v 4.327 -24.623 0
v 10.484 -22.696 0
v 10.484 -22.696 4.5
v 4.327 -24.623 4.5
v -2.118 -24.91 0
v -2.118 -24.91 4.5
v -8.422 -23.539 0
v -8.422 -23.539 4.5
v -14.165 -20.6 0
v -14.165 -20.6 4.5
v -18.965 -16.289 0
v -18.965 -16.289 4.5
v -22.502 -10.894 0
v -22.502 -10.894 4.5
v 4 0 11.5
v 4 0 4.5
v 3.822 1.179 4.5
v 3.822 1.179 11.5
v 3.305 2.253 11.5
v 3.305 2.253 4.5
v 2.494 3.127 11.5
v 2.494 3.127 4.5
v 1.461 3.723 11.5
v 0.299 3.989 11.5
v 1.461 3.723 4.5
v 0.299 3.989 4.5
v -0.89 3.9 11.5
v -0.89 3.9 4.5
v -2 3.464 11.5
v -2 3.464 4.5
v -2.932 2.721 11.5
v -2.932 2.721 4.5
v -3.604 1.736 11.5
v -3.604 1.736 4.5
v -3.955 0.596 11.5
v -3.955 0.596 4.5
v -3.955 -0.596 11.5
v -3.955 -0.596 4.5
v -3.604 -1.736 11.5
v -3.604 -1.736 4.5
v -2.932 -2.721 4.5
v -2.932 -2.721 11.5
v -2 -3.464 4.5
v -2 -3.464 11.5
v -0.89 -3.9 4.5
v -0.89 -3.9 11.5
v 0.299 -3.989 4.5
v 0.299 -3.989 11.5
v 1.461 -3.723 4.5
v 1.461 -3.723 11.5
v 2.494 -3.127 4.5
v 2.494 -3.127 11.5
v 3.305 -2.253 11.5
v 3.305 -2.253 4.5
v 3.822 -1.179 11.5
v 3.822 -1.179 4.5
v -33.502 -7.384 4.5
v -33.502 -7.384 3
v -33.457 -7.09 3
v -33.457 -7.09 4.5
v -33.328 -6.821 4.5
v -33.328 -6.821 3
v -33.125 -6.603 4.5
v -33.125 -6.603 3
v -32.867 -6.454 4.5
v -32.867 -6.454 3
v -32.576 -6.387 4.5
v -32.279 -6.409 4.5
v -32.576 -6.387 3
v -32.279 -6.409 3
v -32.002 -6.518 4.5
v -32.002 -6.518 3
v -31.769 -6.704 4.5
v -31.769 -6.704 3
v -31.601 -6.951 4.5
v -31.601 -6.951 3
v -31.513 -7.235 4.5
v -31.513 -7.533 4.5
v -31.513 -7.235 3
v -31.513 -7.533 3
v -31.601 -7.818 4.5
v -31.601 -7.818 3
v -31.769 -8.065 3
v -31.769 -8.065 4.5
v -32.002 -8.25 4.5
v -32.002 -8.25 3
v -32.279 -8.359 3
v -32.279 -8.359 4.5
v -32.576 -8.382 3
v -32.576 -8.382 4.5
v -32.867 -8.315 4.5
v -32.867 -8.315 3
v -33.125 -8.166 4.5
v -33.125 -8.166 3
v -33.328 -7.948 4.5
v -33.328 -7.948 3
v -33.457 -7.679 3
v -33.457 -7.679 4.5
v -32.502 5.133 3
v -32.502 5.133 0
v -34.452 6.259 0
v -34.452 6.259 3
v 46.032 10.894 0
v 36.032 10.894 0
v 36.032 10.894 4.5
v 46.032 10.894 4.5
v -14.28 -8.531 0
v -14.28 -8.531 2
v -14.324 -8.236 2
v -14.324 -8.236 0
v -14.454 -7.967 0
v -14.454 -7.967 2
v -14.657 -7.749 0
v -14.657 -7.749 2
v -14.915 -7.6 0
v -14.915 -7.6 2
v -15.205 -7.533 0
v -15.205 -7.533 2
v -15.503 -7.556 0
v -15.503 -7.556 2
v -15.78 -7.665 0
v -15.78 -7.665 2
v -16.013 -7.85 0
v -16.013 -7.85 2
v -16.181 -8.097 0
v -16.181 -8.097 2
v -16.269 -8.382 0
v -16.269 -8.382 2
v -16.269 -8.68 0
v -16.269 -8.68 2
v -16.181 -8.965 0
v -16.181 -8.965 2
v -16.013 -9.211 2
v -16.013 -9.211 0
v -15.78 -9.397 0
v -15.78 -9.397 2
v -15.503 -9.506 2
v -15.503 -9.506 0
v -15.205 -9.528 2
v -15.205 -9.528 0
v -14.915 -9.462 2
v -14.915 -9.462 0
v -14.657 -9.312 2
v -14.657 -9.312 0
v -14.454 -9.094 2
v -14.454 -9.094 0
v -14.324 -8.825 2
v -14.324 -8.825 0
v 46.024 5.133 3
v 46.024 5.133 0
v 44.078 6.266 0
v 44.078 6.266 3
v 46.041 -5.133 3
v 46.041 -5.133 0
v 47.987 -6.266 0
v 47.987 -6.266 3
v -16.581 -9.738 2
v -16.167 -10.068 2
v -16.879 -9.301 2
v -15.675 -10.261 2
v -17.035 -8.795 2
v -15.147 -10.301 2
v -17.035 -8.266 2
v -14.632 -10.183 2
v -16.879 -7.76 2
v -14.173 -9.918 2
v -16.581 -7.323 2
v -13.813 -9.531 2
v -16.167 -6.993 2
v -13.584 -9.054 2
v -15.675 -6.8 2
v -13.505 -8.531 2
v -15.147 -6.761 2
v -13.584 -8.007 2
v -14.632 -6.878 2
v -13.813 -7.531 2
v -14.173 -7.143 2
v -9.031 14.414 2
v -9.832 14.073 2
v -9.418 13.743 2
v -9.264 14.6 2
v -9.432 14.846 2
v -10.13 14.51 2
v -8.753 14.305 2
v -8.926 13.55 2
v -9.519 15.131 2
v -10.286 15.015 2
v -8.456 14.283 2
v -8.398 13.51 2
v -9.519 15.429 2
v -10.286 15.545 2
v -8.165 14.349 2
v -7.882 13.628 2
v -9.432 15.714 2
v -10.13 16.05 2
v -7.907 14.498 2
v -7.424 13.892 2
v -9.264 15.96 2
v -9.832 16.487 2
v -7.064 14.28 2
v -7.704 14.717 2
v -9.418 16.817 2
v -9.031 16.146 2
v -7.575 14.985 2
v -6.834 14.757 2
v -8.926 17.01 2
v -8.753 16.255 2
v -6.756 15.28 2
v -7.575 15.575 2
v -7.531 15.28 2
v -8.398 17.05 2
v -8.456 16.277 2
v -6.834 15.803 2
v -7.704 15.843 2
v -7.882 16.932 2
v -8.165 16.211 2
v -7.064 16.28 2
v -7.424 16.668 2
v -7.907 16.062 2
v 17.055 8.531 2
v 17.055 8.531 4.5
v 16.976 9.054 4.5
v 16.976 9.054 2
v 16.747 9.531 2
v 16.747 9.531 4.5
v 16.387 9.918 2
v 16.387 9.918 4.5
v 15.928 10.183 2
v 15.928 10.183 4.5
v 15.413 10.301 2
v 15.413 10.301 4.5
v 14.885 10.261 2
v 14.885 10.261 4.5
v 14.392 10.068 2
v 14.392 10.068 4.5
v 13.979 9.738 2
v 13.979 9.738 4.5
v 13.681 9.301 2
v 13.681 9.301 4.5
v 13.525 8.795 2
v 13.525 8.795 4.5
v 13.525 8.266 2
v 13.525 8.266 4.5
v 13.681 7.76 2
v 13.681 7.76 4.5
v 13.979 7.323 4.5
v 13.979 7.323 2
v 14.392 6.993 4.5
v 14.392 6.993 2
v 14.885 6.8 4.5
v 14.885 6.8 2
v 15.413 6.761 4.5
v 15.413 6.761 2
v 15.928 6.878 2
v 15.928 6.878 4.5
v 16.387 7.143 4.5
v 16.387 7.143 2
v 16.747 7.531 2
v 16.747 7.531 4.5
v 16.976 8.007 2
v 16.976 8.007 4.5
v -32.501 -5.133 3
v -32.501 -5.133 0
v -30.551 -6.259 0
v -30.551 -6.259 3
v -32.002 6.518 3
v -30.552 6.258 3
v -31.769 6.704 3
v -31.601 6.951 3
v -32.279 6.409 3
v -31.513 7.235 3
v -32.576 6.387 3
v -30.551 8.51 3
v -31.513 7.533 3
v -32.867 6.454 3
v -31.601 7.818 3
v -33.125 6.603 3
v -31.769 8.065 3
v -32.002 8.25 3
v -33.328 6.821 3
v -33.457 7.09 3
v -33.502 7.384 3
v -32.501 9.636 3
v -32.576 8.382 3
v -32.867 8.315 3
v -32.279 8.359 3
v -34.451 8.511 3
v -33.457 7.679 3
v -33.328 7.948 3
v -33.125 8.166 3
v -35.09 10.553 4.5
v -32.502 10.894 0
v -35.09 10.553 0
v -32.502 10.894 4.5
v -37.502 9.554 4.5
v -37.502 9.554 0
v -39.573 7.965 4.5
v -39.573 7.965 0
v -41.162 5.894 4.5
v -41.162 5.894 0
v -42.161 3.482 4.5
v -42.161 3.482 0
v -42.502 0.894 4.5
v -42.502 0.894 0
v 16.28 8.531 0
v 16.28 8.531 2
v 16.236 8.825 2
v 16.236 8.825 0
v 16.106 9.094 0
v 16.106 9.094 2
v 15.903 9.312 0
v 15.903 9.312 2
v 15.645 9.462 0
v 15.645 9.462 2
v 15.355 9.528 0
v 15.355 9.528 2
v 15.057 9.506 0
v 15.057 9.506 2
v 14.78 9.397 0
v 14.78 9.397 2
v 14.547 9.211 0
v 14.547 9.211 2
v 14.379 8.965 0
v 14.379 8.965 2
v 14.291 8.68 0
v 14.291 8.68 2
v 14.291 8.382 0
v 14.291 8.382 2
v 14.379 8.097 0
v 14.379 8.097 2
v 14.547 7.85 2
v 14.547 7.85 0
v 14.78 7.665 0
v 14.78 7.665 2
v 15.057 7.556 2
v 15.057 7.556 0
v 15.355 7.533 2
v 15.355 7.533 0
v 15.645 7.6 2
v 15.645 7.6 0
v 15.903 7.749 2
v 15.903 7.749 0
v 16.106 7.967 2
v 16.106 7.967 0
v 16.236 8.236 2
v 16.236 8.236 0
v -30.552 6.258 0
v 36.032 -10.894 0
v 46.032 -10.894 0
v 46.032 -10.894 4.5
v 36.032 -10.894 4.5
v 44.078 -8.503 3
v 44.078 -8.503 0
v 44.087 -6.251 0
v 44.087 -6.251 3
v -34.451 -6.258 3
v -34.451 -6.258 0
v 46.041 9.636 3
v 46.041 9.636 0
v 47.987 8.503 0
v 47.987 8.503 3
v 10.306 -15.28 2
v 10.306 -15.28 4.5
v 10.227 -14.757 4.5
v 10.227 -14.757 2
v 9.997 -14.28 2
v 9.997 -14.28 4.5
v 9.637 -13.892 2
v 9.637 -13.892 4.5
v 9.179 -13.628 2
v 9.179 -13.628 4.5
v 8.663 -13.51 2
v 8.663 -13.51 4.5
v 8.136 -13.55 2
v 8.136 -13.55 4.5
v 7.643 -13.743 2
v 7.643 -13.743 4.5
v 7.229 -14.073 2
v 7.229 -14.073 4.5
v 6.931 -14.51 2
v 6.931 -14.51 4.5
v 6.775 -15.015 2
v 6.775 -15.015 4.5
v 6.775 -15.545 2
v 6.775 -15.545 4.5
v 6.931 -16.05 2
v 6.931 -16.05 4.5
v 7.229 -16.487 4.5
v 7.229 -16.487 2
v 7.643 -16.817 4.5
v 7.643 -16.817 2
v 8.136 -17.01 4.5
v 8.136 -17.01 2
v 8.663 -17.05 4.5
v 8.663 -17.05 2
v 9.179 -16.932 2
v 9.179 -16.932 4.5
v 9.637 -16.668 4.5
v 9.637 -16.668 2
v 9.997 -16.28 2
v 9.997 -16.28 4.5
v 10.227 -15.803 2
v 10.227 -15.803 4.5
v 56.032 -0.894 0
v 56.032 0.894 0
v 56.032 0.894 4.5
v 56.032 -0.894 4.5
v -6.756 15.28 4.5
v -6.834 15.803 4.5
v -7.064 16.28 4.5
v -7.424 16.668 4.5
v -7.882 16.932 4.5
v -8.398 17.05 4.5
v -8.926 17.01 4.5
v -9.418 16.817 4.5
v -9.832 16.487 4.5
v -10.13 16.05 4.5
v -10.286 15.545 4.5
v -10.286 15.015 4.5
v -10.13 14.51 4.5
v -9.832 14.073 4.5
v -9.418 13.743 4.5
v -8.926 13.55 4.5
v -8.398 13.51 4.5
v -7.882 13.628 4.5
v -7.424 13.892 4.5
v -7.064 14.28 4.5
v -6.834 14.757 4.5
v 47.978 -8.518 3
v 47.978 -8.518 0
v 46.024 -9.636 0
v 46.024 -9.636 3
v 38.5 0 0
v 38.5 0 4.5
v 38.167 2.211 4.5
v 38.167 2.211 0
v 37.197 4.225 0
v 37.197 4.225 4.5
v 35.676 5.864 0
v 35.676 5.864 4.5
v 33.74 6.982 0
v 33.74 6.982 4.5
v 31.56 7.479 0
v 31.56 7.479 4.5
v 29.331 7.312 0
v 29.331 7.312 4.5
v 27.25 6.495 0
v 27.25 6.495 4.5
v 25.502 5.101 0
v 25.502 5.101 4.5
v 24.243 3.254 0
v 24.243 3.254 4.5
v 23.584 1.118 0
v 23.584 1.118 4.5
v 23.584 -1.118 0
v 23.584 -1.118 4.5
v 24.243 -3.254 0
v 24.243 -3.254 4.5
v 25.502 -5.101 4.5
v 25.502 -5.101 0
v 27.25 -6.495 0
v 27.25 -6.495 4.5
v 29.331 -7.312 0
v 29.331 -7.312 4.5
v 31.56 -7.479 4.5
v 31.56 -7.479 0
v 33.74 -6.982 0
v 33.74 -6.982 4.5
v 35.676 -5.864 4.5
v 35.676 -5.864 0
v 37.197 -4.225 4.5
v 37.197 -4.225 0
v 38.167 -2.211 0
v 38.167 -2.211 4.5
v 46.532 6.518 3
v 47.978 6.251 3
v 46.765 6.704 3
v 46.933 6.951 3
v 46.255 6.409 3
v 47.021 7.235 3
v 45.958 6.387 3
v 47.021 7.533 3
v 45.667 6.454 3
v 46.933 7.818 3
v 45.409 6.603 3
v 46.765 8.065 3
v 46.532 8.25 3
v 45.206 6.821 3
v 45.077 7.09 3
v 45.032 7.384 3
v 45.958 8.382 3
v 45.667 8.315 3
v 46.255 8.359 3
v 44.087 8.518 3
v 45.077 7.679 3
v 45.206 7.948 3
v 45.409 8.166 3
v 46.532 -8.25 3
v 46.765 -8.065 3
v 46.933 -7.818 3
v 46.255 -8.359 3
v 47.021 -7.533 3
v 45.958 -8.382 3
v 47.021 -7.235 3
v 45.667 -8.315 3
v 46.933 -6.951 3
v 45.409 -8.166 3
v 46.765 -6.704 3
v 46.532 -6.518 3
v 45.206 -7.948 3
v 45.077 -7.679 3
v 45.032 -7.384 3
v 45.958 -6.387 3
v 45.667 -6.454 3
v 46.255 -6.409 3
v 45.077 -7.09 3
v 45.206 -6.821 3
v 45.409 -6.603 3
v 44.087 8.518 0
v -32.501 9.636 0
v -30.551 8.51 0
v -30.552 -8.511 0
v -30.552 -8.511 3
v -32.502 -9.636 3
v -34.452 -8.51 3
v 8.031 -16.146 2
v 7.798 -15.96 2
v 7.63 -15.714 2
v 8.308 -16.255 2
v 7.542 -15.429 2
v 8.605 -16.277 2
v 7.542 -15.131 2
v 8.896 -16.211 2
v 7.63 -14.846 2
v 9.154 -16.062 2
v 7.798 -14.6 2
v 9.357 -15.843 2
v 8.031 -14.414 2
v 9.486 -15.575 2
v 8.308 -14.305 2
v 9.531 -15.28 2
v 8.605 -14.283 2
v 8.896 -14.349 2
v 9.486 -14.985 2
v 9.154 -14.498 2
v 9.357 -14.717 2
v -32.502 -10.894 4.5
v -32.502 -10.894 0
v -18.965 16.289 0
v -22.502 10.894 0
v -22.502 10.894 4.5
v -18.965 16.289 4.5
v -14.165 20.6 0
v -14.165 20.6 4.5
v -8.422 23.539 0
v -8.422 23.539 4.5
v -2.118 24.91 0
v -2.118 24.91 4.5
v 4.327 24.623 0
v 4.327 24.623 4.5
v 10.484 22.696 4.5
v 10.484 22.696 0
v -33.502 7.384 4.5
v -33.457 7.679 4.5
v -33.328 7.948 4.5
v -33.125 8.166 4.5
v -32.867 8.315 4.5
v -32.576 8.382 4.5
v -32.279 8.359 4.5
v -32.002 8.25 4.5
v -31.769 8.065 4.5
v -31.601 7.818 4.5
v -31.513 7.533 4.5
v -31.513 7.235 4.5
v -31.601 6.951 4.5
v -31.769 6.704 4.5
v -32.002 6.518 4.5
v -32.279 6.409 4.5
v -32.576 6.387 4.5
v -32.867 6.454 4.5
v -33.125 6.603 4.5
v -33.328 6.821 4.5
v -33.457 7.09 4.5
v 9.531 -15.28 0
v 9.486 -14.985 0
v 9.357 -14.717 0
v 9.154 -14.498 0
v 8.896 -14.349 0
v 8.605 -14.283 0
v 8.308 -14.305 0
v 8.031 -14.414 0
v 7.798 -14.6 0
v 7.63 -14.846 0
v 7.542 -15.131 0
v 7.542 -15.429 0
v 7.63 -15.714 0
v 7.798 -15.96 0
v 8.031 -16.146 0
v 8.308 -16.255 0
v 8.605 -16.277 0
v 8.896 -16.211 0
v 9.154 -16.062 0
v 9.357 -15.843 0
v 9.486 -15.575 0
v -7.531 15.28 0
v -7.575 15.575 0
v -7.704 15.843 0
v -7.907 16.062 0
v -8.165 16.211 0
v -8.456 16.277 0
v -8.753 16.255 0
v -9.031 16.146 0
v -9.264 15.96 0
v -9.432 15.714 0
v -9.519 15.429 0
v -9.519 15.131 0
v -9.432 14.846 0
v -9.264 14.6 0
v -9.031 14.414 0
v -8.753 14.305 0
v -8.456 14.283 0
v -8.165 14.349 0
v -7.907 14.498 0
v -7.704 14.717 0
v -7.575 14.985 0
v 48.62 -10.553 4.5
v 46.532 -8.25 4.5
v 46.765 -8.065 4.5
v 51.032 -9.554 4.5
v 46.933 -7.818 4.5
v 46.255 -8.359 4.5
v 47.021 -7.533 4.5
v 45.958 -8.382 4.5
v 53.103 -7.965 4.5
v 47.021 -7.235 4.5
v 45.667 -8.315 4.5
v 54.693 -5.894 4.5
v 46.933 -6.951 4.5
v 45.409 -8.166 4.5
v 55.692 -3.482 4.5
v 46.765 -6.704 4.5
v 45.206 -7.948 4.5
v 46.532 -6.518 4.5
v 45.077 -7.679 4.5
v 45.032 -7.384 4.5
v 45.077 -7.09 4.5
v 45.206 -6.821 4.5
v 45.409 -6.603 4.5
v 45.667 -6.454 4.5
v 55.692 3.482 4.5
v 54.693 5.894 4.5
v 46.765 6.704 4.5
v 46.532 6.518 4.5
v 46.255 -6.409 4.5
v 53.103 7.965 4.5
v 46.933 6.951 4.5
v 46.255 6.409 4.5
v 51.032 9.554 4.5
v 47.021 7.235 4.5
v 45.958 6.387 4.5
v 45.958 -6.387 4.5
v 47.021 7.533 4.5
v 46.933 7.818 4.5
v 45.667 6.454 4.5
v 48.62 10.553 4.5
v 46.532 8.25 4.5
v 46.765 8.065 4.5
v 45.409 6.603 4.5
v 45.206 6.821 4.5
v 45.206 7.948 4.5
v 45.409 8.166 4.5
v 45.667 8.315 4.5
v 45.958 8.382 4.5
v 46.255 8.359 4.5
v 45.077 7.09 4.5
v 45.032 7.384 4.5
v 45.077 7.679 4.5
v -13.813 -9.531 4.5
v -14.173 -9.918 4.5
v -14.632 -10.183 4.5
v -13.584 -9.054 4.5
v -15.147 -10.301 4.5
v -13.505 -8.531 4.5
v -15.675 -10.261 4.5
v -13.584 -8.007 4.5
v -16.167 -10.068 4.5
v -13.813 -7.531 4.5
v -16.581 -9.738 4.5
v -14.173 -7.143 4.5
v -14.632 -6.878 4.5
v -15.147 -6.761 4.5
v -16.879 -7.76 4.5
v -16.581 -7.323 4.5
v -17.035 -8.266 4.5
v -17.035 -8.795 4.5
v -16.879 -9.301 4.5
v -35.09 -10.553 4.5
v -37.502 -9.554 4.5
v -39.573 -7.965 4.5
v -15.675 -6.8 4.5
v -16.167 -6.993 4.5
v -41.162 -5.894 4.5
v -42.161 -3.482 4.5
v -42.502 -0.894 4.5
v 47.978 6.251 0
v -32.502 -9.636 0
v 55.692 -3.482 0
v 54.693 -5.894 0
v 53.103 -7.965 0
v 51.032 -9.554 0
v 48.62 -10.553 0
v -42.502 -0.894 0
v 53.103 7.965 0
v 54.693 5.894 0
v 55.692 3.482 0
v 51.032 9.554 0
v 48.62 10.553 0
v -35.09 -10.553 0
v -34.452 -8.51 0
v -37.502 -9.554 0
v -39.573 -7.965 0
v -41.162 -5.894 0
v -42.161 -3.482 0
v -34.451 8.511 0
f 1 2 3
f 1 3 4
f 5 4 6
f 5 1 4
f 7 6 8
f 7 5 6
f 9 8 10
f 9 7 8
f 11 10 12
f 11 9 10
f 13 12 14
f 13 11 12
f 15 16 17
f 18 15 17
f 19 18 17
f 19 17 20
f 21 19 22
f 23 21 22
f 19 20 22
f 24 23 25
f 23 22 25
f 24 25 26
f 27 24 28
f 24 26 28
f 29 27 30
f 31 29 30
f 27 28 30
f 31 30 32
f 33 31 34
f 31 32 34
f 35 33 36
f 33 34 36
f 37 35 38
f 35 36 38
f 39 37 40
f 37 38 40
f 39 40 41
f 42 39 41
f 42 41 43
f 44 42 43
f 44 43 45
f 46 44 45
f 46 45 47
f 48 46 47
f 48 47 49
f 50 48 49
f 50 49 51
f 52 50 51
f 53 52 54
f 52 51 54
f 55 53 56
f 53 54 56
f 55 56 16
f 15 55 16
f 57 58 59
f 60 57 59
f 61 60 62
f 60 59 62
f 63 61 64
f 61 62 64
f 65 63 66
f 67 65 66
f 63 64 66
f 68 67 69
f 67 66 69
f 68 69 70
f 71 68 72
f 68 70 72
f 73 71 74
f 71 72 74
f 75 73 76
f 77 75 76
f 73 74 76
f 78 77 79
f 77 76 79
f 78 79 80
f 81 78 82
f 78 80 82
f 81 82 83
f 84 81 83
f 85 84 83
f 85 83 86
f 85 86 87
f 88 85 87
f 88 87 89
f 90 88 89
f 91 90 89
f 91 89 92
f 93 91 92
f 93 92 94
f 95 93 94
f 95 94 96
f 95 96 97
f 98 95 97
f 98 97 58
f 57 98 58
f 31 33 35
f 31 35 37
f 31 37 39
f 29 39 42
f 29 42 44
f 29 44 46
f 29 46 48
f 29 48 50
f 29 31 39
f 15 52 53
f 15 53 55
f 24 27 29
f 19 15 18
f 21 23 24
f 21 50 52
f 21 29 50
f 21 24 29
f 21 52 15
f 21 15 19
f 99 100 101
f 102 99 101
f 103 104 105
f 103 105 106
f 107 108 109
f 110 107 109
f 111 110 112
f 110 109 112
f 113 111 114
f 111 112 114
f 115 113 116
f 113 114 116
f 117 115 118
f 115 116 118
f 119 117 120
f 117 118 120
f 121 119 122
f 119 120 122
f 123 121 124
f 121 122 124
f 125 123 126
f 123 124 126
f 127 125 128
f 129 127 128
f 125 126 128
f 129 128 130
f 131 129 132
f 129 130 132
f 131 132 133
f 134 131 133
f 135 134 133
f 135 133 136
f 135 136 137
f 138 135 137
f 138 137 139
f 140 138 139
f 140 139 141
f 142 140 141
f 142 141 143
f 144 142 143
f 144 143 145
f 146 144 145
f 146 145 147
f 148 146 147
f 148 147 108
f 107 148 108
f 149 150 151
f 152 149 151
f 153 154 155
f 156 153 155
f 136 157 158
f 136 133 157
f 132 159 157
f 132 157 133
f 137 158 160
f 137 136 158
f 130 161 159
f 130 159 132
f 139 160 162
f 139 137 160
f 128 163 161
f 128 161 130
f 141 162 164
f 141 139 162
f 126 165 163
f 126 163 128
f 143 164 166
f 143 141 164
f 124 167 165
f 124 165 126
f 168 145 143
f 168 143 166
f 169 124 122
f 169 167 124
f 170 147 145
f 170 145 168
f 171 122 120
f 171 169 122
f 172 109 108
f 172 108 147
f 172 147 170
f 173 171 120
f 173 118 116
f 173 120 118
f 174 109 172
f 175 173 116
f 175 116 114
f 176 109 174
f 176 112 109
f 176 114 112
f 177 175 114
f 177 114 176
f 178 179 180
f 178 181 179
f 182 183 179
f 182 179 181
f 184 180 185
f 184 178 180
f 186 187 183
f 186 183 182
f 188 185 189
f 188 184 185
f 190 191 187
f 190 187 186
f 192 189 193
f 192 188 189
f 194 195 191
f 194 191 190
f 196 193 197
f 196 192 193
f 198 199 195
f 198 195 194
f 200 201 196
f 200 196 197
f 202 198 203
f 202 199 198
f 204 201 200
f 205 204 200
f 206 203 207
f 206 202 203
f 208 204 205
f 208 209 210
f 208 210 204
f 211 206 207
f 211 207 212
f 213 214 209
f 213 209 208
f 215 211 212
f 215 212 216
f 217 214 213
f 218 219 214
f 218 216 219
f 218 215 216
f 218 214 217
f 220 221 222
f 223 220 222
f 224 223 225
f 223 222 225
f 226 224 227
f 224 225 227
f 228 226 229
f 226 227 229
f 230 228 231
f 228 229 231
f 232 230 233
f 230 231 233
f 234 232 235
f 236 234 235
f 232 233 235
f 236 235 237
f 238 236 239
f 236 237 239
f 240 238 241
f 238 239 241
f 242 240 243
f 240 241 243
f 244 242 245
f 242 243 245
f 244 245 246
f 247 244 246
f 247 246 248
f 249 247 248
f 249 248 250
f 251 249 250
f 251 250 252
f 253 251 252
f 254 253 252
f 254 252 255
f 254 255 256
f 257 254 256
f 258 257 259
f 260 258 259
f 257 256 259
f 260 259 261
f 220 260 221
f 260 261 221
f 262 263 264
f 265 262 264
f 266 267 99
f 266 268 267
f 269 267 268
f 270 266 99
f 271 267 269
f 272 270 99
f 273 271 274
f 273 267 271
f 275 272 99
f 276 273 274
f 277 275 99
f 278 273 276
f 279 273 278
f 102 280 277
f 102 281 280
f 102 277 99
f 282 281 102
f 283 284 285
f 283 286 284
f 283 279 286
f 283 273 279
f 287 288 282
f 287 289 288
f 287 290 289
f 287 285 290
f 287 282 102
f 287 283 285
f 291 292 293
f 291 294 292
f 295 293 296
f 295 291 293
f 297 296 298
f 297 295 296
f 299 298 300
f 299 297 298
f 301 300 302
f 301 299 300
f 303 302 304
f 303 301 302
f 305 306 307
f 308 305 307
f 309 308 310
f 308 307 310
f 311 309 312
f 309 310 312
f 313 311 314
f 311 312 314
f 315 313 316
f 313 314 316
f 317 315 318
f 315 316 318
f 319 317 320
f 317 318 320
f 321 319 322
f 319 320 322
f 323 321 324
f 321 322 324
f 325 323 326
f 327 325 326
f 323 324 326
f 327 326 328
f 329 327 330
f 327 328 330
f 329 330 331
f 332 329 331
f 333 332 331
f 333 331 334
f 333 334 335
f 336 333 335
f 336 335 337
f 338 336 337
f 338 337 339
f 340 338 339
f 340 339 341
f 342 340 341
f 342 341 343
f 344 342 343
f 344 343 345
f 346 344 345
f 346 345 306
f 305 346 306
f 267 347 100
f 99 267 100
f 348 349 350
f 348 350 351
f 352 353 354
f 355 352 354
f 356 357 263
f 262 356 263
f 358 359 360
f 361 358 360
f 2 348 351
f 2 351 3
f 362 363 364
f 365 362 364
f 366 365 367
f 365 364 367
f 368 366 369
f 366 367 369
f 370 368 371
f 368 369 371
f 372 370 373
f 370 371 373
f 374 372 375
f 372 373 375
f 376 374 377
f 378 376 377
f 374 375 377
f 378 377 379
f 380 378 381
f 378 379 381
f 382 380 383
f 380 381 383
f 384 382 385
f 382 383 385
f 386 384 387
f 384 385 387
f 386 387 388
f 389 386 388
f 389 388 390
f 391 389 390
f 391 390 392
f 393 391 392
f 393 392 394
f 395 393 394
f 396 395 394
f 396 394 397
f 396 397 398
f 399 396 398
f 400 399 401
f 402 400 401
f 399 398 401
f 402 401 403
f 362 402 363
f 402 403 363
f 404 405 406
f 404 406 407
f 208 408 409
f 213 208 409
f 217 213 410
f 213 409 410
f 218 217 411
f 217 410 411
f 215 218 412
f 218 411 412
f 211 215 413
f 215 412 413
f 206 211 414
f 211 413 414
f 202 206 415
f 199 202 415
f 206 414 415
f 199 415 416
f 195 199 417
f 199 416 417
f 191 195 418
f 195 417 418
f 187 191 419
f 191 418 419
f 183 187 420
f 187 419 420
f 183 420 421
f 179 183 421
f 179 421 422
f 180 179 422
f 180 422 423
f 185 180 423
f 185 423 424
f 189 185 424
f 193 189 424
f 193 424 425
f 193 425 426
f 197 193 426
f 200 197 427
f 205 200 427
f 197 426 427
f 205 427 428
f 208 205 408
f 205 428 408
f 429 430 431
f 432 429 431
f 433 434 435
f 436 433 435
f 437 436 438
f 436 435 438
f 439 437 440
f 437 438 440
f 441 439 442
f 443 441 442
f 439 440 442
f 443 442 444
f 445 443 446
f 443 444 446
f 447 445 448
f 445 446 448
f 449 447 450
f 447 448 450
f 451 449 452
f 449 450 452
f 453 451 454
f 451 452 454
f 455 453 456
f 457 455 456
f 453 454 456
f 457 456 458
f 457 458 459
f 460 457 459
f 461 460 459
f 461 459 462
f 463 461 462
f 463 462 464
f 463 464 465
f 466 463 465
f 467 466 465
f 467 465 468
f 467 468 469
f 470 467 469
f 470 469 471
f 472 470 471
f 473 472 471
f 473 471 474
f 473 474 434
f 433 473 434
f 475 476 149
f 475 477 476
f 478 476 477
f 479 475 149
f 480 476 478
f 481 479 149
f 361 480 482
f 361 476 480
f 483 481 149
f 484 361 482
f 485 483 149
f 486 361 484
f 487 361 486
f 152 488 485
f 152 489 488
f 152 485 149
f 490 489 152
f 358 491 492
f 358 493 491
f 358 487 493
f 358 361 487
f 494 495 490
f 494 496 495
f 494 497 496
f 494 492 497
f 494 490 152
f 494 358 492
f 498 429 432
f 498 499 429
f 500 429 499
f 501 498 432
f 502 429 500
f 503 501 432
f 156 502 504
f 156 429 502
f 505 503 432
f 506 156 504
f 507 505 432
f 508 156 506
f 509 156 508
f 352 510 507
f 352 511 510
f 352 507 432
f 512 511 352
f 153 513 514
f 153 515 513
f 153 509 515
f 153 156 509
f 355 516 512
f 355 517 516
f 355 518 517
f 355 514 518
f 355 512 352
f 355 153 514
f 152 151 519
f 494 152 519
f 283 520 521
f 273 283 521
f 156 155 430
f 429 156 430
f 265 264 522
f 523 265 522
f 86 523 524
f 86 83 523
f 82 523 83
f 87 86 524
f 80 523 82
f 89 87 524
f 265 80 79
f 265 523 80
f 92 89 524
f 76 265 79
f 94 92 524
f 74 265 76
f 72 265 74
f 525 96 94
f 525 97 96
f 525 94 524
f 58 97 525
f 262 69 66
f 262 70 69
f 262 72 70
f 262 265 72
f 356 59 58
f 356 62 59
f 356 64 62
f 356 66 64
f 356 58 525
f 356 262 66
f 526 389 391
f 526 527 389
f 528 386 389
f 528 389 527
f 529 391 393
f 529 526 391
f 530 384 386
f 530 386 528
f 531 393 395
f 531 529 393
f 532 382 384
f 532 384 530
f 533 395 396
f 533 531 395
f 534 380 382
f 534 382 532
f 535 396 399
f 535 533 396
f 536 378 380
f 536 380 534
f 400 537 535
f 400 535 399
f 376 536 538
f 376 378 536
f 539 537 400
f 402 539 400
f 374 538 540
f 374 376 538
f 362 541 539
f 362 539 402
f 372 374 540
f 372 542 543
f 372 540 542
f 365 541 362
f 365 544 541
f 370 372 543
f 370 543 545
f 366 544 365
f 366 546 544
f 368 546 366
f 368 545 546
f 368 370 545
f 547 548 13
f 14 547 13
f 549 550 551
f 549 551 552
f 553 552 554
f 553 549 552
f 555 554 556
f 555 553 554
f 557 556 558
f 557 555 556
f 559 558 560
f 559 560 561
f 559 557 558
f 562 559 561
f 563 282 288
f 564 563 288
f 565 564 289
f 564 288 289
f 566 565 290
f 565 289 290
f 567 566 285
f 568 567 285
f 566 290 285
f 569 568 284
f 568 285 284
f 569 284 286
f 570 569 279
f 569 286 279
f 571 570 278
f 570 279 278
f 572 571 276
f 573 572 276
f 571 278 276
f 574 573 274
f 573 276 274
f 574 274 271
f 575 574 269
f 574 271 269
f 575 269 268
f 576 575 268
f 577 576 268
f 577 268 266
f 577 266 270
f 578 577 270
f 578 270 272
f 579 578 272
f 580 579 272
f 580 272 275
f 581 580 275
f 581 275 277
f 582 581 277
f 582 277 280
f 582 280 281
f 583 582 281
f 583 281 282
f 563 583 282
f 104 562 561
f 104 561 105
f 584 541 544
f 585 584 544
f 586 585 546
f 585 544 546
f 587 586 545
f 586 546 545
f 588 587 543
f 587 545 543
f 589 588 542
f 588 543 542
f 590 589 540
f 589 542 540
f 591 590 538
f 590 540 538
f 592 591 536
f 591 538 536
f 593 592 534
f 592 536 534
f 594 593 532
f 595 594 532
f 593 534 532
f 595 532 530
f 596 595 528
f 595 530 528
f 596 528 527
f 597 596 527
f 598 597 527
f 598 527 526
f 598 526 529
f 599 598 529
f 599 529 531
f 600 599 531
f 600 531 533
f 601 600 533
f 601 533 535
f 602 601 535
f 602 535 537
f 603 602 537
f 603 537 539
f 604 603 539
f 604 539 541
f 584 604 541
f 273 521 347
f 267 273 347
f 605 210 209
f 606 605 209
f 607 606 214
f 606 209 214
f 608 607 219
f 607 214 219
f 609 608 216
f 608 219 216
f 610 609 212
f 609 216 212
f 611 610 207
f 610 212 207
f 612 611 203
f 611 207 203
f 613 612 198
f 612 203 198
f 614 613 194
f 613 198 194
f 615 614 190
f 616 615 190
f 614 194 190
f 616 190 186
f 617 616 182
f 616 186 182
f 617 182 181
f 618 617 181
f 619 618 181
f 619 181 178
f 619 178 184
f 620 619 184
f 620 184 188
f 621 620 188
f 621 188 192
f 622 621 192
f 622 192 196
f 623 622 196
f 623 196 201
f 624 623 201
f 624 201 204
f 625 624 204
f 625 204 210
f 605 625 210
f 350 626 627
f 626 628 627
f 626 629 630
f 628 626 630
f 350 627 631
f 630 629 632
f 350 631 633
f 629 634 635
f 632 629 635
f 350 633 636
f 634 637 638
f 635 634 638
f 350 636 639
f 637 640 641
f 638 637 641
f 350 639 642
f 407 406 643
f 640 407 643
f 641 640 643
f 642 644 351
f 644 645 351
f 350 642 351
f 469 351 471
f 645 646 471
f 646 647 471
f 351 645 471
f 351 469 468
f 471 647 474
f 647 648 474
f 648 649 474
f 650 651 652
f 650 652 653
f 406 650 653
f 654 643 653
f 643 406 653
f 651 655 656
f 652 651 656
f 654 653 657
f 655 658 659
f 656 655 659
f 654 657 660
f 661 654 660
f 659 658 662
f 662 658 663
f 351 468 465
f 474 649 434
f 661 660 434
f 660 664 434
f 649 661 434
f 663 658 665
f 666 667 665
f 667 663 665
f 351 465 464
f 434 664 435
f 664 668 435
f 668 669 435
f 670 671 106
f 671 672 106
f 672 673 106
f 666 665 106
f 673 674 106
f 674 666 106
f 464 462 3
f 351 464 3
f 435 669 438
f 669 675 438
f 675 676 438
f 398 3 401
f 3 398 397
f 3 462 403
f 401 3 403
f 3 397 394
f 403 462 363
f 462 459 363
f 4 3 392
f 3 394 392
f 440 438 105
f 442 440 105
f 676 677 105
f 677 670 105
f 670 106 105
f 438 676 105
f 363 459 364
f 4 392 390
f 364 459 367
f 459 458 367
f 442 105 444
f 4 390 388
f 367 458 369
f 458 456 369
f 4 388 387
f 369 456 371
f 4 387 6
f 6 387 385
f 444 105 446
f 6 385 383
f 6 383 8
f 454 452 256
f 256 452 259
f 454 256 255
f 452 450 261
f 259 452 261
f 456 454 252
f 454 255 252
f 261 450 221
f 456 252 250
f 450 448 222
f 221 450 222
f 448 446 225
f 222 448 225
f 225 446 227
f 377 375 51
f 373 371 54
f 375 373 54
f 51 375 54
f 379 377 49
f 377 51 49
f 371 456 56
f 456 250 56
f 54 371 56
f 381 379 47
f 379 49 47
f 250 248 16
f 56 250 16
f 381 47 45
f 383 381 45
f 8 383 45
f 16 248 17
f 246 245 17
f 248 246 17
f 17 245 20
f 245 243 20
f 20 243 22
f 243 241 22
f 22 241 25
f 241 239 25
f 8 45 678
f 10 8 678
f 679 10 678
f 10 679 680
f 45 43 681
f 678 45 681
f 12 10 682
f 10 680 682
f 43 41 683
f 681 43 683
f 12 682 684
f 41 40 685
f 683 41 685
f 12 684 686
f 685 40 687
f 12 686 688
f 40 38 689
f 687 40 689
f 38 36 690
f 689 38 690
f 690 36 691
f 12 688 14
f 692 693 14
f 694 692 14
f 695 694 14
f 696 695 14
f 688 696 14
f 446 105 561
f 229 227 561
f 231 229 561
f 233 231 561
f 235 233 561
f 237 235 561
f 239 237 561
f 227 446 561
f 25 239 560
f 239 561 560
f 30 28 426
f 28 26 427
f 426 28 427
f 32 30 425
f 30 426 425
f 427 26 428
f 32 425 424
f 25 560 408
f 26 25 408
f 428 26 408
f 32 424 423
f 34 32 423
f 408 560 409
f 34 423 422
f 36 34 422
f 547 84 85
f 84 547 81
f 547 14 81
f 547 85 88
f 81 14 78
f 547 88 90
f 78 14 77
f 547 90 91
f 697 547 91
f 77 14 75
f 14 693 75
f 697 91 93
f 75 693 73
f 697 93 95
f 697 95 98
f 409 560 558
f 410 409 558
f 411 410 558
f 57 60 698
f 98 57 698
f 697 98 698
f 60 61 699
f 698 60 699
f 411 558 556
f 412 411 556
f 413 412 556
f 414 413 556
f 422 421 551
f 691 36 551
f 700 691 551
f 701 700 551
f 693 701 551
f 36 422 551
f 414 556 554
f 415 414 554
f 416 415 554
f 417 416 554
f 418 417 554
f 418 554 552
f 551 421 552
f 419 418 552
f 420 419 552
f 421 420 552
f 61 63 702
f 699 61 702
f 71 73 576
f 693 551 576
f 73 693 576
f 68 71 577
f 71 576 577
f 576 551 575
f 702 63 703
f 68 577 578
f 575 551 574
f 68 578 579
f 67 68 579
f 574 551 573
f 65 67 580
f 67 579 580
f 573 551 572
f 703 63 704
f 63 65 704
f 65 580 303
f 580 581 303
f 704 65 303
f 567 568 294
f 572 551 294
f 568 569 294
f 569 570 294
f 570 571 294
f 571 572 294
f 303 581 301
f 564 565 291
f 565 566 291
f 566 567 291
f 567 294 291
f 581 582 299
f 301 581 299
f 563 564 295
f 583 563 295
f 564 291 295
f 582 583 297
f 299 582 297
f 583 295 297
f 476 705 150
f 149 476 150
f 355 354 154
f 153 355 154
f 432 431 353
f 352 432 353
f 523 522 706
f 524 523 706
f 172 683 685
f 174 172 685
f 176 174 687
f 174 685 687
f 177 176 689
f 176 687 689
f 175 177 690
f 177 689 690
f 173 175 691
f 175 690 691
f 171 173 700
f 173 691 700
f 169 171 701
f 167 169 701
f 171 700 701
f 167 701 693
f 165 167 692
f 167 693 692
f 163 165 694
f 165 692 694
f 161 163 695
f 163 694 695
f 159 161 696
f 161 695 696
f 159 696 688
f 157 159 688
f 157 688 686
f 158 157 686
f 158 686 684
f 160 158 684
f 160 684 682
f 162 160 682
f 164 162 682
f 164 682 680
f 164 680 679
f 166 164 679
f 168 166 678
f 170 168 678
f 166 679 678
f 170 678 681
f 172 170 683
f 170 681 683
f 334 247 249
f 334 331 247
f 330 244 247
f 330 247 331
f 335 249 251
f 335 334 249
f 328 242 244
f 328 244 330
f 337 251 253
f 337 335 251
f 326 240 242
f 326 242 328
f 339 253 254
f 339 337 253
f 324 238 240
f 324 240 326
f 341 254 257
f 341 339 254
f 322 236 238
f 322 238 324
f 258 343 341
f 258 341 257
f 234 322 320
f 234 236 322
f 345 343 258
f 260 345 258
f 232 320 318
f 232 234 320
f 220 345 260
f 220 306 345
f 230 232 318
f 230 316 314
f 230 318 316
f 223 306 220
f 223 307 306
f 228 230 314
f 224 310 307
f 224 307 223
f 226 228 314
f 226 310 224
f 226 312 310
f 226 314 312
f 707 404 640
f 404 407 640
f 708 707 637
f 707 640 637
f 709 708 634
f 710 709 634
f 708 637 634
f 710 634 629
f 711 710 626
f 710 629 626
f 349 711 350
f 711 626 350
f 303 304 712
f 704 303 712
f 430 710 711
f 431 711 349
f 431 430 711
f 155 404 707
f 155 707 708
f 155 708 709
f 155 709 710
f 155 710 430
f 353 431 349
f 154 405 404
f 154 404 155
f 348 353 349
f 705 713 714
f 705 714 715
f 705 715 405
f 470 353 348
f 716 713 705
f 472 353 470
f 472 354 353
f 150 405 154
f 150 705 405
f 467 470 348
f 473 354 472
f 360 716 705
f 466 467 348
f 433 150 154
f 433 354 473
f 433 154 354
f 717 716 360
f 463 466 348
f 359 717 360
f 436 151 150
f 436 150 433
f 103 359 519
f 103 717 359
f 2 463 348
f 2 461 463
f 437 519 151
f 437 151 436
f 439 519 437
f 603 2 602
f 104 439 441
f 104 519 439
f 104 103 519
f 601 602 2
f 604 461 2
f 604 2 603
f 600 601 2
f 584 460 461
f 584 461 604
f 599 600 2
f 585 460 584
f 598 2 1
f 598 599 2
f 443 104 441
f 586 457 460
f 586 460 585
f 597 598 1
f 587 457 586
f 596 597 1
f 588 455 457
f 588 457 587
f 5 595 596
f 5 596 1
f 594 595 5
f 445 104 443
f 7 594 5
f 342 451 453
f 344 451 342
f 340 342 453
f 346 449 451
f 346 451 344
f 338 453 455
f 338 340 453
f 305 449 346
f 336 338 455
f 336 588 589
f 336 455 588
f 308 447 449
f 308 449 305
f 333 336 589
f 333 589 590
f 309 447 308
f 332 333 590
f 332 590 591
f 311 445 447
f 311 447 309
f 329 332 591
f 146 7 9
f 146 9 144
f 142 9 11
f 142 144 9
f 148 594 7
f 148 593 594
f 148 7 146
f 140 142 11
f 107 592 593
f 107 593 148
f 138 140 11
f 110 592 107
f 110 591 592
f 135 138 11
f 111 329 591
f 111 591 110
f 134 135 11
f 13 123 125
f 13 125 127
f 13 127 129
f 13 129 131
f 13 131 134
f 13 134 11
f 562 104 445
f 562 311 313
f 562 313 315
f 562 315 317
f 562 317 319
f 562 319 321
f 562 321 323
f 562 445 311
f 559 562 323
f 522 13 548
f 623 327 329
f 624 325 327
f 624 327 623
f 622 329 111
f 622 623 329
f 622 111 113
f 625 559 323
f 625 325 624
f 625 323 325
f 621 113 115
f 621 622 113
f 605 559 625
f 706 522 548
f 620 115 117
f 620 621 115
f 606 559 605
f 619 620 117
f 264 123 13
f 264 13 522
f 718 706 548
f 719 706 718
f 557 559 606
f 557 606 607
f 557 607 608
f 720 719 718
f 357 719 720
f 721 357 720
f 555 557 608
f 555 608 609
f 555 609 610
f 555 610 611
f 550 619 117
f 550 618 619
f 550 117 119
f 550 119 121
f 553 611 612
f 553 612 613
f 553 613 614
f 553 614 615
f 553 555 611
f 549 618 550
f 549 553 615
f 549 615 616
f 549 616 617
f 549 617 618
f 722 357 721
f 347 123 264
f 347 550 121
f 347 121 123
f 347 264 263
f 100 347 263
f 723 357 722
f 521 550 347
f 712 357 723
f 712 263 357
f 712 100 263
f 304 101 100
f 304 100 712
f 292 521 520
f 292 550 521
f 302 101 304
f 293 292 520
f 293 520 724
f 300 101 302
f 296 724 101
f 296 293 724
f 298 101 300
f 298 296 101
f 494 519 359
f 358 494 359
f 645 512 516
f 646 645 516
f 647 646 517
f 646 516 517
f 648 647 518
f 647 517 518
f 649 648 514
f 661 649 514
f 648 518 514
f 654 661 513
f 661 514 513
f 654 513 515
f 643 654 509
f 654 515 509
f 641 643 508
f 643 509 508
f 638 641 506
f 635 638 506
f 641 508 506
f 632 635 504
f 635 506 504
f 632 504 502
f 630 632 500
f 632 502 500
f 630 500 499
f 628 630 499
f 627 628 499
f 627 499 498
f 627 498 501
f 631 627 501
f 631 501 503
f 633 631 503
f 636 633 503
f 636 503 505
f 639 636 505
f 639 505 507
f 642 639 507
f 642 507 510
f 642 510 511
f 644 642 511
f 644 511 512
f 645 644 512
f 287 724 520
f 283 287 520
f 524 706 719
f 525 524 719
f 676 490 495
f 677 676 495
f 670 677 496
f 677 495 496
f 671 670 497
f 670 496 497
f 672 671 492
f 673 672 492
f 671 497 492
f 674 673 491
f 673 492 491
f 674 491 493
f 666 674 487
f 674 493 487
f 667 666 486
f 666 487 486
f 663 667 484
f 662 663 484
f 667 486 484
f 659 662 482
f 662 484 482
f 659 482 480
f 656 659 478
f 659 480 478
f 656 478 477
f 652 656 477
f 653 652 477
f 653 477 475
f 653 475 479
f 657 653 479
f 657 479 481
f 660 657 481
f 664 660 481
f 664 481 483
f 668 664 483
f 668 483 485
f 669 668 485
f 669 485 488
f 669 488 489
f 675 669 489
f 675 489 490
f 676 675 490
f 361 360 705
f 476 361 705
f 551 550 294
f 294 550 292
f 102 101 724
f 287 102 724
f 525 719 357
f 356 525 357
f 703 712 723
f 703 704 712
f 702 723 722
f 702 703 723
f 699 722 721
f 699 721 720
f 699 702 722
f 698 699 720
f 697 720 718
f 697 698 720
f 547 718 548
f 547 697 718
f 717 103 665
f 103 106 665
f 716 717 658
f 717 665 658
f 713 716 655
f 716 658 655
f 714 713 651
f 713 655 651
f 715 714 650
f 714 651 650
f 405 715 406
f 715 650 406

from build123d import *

# Parameters (mm, degrees)
BOSS_EXTRUDE1_DEPTH = 4.5
SKETCH2_R           = 7.5
CUT_EXTRUDE1_DEPTH  = 50.942466899
SKETCH3_R           = 4
BOSS_EXTRUDE2_DEPTH = 7
BOSS_EXTRUDE3_DEPTH = 4.5
FILLET1_R           = 10
SKETCH6_R           = 1
CUT_EXTRUDE2_DEPTH  = 63.42486639
CUT_EXTRUDE3_DEPTH  = 3
SKETCH10_R          = 1
CUT_EXTRUDE4_DEPTH  = 62.754464971
SKETCH11_R          = 1.775
CUT_EXTRUDE5_DEPTH  = 2.5


with BuildPart() as part:
    # Sketch1 → Boss-Extrude1 (new body)
    with BuildSketch(Plane.XY):
        with BuildLine():
            Line((10.483870968, 22.695560128), (36.032258065, 10.893868862))
            ThreePointArc((36.032258065, 10.893868862), (43, 0), (36.032258065, -10.893868862))
            Line((36.032258065, -10.893868862), (10.483870968, -22.695560128))
            ThreePointArc((10.483870968, -22.695560128), (-25, 0), (10.483870968, 22.695560128))
        make_face()
    extrude(amount=BOSS_EXTRUDE1_DEPTH)

    # Sketch2 → Cut-Extrude1 (cut, through all)
    with BuildSketch(Plane.XY.offset(4.5)):
        with Locations((31, 0)):
            Circle(SKETCH2_R)
    extrude(amount=-CUT_EXTRUDE1_DEPTH, mode=Mode.SUBTRACT)

    # Sketch3 → Boss-Extrude2 (add)
    with BuildSketch(Plane.XY.offset(4.5)):
        Circle(SKETCH3_R)
    extrude(amount=BOSS_EXTRUDE2_DEPTH)

    # Sketch4 → Boss-Extrude3 (add)
    with BuildSketch(Plane(origin=(0, 0, 0), x_dir=(-1, 0, 0), z_dir=(0, 0, -1))):
        with BuildLine():
            Line((-36.032258065, 10.893868862), (-56.032258065, 10.893868862))
            Line((-56.032258065, 10.893868862), (-56.032258065, -10.893868862))
            Line((-56.032258065, -10.893868862), (-36.032258065, -10.893868862))
            ThreePointArc((-36.032258065, -10.893868862), (-43, 0), (-36.032258065, 10.893868862))
        make_face()
        with BuildLine():
            Line((22.501635968, 10.893868862), (42.501635968, 10.893868862))
            Line((42.501635968, 10.893868862), (42.501635968, -10.893868862))
            Line((42.501635968, -10.893868862), (22.501635968, -10.893868862))
            ThreePointArc((22.501635968, -10.893868862), (25, 0), (22.501635968, 10.893868862))
        make_face()
    extrude(amount=-BOSS_EXTRUDE3_DEPTH)

    # Fillet1
    fillet1_edges = [part.edges().sort_by_distance(p)[0] for p in [
        (56.032258065, 10.893868862, 2.25),
        (56.032258065, -10.893868862, 2.25),
        (-42.501635968, -10.893868862, 2.25),
        (-42.501635968, 10.893868862, 2.25),
    ]]
    fillet(fillet1_edges, radius=FILLET1_R)

    # Sketch6 → Cut-Extrude2 (cut, through all)
    with BuildSketch(Plane(origin=(0, 0, 0), x_dir=(-1, 0, 0), z_dir=(0, 0, -1))):
        with Locations((32.501635968, -7.384406603)):
            Circle(SKETCH6_R)
        with Locations((32.501635968, 7.384406603)):
            Circle(SKETCH6_R)
        with Locations((-46.032258065, -7.384406603)):
            Circle(SKETCH6_R)
        with Locations((-46.032258065, 7.384406603)):
            Circle(SKETCH6_R)
    extrude(amount=-CUT_EXTRUDE2_DEPTH, mode=Mode.SUBTRACT)

    # Sketch7 → Cut-Extrude3 (cut)
    with BuildSketch(Plane(origin=(0, 0, 0), x_dir=(-1, 0, 0), z_dir=(0, 0, -1))):
        Polygon((-46.040823363, 9.636056412), (-47.986526649, 8.502813742), (-47.97796135, 6.251163933), (-46.023692766, 5.132756795), (-44.07798948, 6.265999465), (-44.086554779, 8.517649274), align=None)
        Polygon((-46.040823363, -5.132756795), (-47.986526649, -6.265999465), (-47.97796135, -8.517649274), (-46.023692766, -9.636056412), (-44.07798948, -8.502813742), (-44.086554779, -6.251163933), align=None)
        Polygon((32.500854226, 9.636072568), (30.551245171, 8.509562577), (30.552026913, 6.257896613), (32.502417709, 5.132740639), (34.452026765, 6.259250629), (34.451245023, 8.510916594), align=None)
        Polygon((32.500854226, -5.132740639), (30.551245171, -6.259250629), (30.552026913, -8.510916594), (32.502417709, -9.636072568), (34.452026765, -8.509562577), (34.451245023, -6.257896613), align=None)
    extrude(amount=-CUT_EXTRUDE3_DEPTH, mode=Mode.SUBTRACT)

    # Sketch10 → Cut-Extrude4 (cut, through all)
    with BuildSketch(Plane.XY.offset(4.5)):
        with Locations((8.530630169, -15.279998329)):
            Circle(SKETCH10_R)
        with Locations((-15.279998329, -8.530630169)):
            Circle(SKETCH10_R)
        with Locations((-8.530630169, 15.279998329)):
            Circle(SKETCH10_R)
        with Locations((15.279998329, 8.530630169)):
            Circle(SKETCH10_R)
    extrude(amount=-CUT_EXTRUDE4_DEPTH, mode=Mode.SUBTRACT)

    # Sketch11 → Cut-Extrude5 (cut)
    with BuildSketch(Plane.XY.offset(4.5)):
        with Locations((-8.530630169, 15.279998329)):
            Circle(SKETCH11_R)
        with Locations((15.279998329, 8.530630169)):
            Circle(SKETCH11_R)
        with Locations((8.530630169, -15.279998329)):
            Circle(SKETCH11_R)
        with Locations((-15.279998329, -8.530630169)):
            Circle(SKETCH11_R)
    extrude(amount=-CUT_EXTRUDE5_DEPTH, mode=Mode.SUBTRACT)


solid = part.part
